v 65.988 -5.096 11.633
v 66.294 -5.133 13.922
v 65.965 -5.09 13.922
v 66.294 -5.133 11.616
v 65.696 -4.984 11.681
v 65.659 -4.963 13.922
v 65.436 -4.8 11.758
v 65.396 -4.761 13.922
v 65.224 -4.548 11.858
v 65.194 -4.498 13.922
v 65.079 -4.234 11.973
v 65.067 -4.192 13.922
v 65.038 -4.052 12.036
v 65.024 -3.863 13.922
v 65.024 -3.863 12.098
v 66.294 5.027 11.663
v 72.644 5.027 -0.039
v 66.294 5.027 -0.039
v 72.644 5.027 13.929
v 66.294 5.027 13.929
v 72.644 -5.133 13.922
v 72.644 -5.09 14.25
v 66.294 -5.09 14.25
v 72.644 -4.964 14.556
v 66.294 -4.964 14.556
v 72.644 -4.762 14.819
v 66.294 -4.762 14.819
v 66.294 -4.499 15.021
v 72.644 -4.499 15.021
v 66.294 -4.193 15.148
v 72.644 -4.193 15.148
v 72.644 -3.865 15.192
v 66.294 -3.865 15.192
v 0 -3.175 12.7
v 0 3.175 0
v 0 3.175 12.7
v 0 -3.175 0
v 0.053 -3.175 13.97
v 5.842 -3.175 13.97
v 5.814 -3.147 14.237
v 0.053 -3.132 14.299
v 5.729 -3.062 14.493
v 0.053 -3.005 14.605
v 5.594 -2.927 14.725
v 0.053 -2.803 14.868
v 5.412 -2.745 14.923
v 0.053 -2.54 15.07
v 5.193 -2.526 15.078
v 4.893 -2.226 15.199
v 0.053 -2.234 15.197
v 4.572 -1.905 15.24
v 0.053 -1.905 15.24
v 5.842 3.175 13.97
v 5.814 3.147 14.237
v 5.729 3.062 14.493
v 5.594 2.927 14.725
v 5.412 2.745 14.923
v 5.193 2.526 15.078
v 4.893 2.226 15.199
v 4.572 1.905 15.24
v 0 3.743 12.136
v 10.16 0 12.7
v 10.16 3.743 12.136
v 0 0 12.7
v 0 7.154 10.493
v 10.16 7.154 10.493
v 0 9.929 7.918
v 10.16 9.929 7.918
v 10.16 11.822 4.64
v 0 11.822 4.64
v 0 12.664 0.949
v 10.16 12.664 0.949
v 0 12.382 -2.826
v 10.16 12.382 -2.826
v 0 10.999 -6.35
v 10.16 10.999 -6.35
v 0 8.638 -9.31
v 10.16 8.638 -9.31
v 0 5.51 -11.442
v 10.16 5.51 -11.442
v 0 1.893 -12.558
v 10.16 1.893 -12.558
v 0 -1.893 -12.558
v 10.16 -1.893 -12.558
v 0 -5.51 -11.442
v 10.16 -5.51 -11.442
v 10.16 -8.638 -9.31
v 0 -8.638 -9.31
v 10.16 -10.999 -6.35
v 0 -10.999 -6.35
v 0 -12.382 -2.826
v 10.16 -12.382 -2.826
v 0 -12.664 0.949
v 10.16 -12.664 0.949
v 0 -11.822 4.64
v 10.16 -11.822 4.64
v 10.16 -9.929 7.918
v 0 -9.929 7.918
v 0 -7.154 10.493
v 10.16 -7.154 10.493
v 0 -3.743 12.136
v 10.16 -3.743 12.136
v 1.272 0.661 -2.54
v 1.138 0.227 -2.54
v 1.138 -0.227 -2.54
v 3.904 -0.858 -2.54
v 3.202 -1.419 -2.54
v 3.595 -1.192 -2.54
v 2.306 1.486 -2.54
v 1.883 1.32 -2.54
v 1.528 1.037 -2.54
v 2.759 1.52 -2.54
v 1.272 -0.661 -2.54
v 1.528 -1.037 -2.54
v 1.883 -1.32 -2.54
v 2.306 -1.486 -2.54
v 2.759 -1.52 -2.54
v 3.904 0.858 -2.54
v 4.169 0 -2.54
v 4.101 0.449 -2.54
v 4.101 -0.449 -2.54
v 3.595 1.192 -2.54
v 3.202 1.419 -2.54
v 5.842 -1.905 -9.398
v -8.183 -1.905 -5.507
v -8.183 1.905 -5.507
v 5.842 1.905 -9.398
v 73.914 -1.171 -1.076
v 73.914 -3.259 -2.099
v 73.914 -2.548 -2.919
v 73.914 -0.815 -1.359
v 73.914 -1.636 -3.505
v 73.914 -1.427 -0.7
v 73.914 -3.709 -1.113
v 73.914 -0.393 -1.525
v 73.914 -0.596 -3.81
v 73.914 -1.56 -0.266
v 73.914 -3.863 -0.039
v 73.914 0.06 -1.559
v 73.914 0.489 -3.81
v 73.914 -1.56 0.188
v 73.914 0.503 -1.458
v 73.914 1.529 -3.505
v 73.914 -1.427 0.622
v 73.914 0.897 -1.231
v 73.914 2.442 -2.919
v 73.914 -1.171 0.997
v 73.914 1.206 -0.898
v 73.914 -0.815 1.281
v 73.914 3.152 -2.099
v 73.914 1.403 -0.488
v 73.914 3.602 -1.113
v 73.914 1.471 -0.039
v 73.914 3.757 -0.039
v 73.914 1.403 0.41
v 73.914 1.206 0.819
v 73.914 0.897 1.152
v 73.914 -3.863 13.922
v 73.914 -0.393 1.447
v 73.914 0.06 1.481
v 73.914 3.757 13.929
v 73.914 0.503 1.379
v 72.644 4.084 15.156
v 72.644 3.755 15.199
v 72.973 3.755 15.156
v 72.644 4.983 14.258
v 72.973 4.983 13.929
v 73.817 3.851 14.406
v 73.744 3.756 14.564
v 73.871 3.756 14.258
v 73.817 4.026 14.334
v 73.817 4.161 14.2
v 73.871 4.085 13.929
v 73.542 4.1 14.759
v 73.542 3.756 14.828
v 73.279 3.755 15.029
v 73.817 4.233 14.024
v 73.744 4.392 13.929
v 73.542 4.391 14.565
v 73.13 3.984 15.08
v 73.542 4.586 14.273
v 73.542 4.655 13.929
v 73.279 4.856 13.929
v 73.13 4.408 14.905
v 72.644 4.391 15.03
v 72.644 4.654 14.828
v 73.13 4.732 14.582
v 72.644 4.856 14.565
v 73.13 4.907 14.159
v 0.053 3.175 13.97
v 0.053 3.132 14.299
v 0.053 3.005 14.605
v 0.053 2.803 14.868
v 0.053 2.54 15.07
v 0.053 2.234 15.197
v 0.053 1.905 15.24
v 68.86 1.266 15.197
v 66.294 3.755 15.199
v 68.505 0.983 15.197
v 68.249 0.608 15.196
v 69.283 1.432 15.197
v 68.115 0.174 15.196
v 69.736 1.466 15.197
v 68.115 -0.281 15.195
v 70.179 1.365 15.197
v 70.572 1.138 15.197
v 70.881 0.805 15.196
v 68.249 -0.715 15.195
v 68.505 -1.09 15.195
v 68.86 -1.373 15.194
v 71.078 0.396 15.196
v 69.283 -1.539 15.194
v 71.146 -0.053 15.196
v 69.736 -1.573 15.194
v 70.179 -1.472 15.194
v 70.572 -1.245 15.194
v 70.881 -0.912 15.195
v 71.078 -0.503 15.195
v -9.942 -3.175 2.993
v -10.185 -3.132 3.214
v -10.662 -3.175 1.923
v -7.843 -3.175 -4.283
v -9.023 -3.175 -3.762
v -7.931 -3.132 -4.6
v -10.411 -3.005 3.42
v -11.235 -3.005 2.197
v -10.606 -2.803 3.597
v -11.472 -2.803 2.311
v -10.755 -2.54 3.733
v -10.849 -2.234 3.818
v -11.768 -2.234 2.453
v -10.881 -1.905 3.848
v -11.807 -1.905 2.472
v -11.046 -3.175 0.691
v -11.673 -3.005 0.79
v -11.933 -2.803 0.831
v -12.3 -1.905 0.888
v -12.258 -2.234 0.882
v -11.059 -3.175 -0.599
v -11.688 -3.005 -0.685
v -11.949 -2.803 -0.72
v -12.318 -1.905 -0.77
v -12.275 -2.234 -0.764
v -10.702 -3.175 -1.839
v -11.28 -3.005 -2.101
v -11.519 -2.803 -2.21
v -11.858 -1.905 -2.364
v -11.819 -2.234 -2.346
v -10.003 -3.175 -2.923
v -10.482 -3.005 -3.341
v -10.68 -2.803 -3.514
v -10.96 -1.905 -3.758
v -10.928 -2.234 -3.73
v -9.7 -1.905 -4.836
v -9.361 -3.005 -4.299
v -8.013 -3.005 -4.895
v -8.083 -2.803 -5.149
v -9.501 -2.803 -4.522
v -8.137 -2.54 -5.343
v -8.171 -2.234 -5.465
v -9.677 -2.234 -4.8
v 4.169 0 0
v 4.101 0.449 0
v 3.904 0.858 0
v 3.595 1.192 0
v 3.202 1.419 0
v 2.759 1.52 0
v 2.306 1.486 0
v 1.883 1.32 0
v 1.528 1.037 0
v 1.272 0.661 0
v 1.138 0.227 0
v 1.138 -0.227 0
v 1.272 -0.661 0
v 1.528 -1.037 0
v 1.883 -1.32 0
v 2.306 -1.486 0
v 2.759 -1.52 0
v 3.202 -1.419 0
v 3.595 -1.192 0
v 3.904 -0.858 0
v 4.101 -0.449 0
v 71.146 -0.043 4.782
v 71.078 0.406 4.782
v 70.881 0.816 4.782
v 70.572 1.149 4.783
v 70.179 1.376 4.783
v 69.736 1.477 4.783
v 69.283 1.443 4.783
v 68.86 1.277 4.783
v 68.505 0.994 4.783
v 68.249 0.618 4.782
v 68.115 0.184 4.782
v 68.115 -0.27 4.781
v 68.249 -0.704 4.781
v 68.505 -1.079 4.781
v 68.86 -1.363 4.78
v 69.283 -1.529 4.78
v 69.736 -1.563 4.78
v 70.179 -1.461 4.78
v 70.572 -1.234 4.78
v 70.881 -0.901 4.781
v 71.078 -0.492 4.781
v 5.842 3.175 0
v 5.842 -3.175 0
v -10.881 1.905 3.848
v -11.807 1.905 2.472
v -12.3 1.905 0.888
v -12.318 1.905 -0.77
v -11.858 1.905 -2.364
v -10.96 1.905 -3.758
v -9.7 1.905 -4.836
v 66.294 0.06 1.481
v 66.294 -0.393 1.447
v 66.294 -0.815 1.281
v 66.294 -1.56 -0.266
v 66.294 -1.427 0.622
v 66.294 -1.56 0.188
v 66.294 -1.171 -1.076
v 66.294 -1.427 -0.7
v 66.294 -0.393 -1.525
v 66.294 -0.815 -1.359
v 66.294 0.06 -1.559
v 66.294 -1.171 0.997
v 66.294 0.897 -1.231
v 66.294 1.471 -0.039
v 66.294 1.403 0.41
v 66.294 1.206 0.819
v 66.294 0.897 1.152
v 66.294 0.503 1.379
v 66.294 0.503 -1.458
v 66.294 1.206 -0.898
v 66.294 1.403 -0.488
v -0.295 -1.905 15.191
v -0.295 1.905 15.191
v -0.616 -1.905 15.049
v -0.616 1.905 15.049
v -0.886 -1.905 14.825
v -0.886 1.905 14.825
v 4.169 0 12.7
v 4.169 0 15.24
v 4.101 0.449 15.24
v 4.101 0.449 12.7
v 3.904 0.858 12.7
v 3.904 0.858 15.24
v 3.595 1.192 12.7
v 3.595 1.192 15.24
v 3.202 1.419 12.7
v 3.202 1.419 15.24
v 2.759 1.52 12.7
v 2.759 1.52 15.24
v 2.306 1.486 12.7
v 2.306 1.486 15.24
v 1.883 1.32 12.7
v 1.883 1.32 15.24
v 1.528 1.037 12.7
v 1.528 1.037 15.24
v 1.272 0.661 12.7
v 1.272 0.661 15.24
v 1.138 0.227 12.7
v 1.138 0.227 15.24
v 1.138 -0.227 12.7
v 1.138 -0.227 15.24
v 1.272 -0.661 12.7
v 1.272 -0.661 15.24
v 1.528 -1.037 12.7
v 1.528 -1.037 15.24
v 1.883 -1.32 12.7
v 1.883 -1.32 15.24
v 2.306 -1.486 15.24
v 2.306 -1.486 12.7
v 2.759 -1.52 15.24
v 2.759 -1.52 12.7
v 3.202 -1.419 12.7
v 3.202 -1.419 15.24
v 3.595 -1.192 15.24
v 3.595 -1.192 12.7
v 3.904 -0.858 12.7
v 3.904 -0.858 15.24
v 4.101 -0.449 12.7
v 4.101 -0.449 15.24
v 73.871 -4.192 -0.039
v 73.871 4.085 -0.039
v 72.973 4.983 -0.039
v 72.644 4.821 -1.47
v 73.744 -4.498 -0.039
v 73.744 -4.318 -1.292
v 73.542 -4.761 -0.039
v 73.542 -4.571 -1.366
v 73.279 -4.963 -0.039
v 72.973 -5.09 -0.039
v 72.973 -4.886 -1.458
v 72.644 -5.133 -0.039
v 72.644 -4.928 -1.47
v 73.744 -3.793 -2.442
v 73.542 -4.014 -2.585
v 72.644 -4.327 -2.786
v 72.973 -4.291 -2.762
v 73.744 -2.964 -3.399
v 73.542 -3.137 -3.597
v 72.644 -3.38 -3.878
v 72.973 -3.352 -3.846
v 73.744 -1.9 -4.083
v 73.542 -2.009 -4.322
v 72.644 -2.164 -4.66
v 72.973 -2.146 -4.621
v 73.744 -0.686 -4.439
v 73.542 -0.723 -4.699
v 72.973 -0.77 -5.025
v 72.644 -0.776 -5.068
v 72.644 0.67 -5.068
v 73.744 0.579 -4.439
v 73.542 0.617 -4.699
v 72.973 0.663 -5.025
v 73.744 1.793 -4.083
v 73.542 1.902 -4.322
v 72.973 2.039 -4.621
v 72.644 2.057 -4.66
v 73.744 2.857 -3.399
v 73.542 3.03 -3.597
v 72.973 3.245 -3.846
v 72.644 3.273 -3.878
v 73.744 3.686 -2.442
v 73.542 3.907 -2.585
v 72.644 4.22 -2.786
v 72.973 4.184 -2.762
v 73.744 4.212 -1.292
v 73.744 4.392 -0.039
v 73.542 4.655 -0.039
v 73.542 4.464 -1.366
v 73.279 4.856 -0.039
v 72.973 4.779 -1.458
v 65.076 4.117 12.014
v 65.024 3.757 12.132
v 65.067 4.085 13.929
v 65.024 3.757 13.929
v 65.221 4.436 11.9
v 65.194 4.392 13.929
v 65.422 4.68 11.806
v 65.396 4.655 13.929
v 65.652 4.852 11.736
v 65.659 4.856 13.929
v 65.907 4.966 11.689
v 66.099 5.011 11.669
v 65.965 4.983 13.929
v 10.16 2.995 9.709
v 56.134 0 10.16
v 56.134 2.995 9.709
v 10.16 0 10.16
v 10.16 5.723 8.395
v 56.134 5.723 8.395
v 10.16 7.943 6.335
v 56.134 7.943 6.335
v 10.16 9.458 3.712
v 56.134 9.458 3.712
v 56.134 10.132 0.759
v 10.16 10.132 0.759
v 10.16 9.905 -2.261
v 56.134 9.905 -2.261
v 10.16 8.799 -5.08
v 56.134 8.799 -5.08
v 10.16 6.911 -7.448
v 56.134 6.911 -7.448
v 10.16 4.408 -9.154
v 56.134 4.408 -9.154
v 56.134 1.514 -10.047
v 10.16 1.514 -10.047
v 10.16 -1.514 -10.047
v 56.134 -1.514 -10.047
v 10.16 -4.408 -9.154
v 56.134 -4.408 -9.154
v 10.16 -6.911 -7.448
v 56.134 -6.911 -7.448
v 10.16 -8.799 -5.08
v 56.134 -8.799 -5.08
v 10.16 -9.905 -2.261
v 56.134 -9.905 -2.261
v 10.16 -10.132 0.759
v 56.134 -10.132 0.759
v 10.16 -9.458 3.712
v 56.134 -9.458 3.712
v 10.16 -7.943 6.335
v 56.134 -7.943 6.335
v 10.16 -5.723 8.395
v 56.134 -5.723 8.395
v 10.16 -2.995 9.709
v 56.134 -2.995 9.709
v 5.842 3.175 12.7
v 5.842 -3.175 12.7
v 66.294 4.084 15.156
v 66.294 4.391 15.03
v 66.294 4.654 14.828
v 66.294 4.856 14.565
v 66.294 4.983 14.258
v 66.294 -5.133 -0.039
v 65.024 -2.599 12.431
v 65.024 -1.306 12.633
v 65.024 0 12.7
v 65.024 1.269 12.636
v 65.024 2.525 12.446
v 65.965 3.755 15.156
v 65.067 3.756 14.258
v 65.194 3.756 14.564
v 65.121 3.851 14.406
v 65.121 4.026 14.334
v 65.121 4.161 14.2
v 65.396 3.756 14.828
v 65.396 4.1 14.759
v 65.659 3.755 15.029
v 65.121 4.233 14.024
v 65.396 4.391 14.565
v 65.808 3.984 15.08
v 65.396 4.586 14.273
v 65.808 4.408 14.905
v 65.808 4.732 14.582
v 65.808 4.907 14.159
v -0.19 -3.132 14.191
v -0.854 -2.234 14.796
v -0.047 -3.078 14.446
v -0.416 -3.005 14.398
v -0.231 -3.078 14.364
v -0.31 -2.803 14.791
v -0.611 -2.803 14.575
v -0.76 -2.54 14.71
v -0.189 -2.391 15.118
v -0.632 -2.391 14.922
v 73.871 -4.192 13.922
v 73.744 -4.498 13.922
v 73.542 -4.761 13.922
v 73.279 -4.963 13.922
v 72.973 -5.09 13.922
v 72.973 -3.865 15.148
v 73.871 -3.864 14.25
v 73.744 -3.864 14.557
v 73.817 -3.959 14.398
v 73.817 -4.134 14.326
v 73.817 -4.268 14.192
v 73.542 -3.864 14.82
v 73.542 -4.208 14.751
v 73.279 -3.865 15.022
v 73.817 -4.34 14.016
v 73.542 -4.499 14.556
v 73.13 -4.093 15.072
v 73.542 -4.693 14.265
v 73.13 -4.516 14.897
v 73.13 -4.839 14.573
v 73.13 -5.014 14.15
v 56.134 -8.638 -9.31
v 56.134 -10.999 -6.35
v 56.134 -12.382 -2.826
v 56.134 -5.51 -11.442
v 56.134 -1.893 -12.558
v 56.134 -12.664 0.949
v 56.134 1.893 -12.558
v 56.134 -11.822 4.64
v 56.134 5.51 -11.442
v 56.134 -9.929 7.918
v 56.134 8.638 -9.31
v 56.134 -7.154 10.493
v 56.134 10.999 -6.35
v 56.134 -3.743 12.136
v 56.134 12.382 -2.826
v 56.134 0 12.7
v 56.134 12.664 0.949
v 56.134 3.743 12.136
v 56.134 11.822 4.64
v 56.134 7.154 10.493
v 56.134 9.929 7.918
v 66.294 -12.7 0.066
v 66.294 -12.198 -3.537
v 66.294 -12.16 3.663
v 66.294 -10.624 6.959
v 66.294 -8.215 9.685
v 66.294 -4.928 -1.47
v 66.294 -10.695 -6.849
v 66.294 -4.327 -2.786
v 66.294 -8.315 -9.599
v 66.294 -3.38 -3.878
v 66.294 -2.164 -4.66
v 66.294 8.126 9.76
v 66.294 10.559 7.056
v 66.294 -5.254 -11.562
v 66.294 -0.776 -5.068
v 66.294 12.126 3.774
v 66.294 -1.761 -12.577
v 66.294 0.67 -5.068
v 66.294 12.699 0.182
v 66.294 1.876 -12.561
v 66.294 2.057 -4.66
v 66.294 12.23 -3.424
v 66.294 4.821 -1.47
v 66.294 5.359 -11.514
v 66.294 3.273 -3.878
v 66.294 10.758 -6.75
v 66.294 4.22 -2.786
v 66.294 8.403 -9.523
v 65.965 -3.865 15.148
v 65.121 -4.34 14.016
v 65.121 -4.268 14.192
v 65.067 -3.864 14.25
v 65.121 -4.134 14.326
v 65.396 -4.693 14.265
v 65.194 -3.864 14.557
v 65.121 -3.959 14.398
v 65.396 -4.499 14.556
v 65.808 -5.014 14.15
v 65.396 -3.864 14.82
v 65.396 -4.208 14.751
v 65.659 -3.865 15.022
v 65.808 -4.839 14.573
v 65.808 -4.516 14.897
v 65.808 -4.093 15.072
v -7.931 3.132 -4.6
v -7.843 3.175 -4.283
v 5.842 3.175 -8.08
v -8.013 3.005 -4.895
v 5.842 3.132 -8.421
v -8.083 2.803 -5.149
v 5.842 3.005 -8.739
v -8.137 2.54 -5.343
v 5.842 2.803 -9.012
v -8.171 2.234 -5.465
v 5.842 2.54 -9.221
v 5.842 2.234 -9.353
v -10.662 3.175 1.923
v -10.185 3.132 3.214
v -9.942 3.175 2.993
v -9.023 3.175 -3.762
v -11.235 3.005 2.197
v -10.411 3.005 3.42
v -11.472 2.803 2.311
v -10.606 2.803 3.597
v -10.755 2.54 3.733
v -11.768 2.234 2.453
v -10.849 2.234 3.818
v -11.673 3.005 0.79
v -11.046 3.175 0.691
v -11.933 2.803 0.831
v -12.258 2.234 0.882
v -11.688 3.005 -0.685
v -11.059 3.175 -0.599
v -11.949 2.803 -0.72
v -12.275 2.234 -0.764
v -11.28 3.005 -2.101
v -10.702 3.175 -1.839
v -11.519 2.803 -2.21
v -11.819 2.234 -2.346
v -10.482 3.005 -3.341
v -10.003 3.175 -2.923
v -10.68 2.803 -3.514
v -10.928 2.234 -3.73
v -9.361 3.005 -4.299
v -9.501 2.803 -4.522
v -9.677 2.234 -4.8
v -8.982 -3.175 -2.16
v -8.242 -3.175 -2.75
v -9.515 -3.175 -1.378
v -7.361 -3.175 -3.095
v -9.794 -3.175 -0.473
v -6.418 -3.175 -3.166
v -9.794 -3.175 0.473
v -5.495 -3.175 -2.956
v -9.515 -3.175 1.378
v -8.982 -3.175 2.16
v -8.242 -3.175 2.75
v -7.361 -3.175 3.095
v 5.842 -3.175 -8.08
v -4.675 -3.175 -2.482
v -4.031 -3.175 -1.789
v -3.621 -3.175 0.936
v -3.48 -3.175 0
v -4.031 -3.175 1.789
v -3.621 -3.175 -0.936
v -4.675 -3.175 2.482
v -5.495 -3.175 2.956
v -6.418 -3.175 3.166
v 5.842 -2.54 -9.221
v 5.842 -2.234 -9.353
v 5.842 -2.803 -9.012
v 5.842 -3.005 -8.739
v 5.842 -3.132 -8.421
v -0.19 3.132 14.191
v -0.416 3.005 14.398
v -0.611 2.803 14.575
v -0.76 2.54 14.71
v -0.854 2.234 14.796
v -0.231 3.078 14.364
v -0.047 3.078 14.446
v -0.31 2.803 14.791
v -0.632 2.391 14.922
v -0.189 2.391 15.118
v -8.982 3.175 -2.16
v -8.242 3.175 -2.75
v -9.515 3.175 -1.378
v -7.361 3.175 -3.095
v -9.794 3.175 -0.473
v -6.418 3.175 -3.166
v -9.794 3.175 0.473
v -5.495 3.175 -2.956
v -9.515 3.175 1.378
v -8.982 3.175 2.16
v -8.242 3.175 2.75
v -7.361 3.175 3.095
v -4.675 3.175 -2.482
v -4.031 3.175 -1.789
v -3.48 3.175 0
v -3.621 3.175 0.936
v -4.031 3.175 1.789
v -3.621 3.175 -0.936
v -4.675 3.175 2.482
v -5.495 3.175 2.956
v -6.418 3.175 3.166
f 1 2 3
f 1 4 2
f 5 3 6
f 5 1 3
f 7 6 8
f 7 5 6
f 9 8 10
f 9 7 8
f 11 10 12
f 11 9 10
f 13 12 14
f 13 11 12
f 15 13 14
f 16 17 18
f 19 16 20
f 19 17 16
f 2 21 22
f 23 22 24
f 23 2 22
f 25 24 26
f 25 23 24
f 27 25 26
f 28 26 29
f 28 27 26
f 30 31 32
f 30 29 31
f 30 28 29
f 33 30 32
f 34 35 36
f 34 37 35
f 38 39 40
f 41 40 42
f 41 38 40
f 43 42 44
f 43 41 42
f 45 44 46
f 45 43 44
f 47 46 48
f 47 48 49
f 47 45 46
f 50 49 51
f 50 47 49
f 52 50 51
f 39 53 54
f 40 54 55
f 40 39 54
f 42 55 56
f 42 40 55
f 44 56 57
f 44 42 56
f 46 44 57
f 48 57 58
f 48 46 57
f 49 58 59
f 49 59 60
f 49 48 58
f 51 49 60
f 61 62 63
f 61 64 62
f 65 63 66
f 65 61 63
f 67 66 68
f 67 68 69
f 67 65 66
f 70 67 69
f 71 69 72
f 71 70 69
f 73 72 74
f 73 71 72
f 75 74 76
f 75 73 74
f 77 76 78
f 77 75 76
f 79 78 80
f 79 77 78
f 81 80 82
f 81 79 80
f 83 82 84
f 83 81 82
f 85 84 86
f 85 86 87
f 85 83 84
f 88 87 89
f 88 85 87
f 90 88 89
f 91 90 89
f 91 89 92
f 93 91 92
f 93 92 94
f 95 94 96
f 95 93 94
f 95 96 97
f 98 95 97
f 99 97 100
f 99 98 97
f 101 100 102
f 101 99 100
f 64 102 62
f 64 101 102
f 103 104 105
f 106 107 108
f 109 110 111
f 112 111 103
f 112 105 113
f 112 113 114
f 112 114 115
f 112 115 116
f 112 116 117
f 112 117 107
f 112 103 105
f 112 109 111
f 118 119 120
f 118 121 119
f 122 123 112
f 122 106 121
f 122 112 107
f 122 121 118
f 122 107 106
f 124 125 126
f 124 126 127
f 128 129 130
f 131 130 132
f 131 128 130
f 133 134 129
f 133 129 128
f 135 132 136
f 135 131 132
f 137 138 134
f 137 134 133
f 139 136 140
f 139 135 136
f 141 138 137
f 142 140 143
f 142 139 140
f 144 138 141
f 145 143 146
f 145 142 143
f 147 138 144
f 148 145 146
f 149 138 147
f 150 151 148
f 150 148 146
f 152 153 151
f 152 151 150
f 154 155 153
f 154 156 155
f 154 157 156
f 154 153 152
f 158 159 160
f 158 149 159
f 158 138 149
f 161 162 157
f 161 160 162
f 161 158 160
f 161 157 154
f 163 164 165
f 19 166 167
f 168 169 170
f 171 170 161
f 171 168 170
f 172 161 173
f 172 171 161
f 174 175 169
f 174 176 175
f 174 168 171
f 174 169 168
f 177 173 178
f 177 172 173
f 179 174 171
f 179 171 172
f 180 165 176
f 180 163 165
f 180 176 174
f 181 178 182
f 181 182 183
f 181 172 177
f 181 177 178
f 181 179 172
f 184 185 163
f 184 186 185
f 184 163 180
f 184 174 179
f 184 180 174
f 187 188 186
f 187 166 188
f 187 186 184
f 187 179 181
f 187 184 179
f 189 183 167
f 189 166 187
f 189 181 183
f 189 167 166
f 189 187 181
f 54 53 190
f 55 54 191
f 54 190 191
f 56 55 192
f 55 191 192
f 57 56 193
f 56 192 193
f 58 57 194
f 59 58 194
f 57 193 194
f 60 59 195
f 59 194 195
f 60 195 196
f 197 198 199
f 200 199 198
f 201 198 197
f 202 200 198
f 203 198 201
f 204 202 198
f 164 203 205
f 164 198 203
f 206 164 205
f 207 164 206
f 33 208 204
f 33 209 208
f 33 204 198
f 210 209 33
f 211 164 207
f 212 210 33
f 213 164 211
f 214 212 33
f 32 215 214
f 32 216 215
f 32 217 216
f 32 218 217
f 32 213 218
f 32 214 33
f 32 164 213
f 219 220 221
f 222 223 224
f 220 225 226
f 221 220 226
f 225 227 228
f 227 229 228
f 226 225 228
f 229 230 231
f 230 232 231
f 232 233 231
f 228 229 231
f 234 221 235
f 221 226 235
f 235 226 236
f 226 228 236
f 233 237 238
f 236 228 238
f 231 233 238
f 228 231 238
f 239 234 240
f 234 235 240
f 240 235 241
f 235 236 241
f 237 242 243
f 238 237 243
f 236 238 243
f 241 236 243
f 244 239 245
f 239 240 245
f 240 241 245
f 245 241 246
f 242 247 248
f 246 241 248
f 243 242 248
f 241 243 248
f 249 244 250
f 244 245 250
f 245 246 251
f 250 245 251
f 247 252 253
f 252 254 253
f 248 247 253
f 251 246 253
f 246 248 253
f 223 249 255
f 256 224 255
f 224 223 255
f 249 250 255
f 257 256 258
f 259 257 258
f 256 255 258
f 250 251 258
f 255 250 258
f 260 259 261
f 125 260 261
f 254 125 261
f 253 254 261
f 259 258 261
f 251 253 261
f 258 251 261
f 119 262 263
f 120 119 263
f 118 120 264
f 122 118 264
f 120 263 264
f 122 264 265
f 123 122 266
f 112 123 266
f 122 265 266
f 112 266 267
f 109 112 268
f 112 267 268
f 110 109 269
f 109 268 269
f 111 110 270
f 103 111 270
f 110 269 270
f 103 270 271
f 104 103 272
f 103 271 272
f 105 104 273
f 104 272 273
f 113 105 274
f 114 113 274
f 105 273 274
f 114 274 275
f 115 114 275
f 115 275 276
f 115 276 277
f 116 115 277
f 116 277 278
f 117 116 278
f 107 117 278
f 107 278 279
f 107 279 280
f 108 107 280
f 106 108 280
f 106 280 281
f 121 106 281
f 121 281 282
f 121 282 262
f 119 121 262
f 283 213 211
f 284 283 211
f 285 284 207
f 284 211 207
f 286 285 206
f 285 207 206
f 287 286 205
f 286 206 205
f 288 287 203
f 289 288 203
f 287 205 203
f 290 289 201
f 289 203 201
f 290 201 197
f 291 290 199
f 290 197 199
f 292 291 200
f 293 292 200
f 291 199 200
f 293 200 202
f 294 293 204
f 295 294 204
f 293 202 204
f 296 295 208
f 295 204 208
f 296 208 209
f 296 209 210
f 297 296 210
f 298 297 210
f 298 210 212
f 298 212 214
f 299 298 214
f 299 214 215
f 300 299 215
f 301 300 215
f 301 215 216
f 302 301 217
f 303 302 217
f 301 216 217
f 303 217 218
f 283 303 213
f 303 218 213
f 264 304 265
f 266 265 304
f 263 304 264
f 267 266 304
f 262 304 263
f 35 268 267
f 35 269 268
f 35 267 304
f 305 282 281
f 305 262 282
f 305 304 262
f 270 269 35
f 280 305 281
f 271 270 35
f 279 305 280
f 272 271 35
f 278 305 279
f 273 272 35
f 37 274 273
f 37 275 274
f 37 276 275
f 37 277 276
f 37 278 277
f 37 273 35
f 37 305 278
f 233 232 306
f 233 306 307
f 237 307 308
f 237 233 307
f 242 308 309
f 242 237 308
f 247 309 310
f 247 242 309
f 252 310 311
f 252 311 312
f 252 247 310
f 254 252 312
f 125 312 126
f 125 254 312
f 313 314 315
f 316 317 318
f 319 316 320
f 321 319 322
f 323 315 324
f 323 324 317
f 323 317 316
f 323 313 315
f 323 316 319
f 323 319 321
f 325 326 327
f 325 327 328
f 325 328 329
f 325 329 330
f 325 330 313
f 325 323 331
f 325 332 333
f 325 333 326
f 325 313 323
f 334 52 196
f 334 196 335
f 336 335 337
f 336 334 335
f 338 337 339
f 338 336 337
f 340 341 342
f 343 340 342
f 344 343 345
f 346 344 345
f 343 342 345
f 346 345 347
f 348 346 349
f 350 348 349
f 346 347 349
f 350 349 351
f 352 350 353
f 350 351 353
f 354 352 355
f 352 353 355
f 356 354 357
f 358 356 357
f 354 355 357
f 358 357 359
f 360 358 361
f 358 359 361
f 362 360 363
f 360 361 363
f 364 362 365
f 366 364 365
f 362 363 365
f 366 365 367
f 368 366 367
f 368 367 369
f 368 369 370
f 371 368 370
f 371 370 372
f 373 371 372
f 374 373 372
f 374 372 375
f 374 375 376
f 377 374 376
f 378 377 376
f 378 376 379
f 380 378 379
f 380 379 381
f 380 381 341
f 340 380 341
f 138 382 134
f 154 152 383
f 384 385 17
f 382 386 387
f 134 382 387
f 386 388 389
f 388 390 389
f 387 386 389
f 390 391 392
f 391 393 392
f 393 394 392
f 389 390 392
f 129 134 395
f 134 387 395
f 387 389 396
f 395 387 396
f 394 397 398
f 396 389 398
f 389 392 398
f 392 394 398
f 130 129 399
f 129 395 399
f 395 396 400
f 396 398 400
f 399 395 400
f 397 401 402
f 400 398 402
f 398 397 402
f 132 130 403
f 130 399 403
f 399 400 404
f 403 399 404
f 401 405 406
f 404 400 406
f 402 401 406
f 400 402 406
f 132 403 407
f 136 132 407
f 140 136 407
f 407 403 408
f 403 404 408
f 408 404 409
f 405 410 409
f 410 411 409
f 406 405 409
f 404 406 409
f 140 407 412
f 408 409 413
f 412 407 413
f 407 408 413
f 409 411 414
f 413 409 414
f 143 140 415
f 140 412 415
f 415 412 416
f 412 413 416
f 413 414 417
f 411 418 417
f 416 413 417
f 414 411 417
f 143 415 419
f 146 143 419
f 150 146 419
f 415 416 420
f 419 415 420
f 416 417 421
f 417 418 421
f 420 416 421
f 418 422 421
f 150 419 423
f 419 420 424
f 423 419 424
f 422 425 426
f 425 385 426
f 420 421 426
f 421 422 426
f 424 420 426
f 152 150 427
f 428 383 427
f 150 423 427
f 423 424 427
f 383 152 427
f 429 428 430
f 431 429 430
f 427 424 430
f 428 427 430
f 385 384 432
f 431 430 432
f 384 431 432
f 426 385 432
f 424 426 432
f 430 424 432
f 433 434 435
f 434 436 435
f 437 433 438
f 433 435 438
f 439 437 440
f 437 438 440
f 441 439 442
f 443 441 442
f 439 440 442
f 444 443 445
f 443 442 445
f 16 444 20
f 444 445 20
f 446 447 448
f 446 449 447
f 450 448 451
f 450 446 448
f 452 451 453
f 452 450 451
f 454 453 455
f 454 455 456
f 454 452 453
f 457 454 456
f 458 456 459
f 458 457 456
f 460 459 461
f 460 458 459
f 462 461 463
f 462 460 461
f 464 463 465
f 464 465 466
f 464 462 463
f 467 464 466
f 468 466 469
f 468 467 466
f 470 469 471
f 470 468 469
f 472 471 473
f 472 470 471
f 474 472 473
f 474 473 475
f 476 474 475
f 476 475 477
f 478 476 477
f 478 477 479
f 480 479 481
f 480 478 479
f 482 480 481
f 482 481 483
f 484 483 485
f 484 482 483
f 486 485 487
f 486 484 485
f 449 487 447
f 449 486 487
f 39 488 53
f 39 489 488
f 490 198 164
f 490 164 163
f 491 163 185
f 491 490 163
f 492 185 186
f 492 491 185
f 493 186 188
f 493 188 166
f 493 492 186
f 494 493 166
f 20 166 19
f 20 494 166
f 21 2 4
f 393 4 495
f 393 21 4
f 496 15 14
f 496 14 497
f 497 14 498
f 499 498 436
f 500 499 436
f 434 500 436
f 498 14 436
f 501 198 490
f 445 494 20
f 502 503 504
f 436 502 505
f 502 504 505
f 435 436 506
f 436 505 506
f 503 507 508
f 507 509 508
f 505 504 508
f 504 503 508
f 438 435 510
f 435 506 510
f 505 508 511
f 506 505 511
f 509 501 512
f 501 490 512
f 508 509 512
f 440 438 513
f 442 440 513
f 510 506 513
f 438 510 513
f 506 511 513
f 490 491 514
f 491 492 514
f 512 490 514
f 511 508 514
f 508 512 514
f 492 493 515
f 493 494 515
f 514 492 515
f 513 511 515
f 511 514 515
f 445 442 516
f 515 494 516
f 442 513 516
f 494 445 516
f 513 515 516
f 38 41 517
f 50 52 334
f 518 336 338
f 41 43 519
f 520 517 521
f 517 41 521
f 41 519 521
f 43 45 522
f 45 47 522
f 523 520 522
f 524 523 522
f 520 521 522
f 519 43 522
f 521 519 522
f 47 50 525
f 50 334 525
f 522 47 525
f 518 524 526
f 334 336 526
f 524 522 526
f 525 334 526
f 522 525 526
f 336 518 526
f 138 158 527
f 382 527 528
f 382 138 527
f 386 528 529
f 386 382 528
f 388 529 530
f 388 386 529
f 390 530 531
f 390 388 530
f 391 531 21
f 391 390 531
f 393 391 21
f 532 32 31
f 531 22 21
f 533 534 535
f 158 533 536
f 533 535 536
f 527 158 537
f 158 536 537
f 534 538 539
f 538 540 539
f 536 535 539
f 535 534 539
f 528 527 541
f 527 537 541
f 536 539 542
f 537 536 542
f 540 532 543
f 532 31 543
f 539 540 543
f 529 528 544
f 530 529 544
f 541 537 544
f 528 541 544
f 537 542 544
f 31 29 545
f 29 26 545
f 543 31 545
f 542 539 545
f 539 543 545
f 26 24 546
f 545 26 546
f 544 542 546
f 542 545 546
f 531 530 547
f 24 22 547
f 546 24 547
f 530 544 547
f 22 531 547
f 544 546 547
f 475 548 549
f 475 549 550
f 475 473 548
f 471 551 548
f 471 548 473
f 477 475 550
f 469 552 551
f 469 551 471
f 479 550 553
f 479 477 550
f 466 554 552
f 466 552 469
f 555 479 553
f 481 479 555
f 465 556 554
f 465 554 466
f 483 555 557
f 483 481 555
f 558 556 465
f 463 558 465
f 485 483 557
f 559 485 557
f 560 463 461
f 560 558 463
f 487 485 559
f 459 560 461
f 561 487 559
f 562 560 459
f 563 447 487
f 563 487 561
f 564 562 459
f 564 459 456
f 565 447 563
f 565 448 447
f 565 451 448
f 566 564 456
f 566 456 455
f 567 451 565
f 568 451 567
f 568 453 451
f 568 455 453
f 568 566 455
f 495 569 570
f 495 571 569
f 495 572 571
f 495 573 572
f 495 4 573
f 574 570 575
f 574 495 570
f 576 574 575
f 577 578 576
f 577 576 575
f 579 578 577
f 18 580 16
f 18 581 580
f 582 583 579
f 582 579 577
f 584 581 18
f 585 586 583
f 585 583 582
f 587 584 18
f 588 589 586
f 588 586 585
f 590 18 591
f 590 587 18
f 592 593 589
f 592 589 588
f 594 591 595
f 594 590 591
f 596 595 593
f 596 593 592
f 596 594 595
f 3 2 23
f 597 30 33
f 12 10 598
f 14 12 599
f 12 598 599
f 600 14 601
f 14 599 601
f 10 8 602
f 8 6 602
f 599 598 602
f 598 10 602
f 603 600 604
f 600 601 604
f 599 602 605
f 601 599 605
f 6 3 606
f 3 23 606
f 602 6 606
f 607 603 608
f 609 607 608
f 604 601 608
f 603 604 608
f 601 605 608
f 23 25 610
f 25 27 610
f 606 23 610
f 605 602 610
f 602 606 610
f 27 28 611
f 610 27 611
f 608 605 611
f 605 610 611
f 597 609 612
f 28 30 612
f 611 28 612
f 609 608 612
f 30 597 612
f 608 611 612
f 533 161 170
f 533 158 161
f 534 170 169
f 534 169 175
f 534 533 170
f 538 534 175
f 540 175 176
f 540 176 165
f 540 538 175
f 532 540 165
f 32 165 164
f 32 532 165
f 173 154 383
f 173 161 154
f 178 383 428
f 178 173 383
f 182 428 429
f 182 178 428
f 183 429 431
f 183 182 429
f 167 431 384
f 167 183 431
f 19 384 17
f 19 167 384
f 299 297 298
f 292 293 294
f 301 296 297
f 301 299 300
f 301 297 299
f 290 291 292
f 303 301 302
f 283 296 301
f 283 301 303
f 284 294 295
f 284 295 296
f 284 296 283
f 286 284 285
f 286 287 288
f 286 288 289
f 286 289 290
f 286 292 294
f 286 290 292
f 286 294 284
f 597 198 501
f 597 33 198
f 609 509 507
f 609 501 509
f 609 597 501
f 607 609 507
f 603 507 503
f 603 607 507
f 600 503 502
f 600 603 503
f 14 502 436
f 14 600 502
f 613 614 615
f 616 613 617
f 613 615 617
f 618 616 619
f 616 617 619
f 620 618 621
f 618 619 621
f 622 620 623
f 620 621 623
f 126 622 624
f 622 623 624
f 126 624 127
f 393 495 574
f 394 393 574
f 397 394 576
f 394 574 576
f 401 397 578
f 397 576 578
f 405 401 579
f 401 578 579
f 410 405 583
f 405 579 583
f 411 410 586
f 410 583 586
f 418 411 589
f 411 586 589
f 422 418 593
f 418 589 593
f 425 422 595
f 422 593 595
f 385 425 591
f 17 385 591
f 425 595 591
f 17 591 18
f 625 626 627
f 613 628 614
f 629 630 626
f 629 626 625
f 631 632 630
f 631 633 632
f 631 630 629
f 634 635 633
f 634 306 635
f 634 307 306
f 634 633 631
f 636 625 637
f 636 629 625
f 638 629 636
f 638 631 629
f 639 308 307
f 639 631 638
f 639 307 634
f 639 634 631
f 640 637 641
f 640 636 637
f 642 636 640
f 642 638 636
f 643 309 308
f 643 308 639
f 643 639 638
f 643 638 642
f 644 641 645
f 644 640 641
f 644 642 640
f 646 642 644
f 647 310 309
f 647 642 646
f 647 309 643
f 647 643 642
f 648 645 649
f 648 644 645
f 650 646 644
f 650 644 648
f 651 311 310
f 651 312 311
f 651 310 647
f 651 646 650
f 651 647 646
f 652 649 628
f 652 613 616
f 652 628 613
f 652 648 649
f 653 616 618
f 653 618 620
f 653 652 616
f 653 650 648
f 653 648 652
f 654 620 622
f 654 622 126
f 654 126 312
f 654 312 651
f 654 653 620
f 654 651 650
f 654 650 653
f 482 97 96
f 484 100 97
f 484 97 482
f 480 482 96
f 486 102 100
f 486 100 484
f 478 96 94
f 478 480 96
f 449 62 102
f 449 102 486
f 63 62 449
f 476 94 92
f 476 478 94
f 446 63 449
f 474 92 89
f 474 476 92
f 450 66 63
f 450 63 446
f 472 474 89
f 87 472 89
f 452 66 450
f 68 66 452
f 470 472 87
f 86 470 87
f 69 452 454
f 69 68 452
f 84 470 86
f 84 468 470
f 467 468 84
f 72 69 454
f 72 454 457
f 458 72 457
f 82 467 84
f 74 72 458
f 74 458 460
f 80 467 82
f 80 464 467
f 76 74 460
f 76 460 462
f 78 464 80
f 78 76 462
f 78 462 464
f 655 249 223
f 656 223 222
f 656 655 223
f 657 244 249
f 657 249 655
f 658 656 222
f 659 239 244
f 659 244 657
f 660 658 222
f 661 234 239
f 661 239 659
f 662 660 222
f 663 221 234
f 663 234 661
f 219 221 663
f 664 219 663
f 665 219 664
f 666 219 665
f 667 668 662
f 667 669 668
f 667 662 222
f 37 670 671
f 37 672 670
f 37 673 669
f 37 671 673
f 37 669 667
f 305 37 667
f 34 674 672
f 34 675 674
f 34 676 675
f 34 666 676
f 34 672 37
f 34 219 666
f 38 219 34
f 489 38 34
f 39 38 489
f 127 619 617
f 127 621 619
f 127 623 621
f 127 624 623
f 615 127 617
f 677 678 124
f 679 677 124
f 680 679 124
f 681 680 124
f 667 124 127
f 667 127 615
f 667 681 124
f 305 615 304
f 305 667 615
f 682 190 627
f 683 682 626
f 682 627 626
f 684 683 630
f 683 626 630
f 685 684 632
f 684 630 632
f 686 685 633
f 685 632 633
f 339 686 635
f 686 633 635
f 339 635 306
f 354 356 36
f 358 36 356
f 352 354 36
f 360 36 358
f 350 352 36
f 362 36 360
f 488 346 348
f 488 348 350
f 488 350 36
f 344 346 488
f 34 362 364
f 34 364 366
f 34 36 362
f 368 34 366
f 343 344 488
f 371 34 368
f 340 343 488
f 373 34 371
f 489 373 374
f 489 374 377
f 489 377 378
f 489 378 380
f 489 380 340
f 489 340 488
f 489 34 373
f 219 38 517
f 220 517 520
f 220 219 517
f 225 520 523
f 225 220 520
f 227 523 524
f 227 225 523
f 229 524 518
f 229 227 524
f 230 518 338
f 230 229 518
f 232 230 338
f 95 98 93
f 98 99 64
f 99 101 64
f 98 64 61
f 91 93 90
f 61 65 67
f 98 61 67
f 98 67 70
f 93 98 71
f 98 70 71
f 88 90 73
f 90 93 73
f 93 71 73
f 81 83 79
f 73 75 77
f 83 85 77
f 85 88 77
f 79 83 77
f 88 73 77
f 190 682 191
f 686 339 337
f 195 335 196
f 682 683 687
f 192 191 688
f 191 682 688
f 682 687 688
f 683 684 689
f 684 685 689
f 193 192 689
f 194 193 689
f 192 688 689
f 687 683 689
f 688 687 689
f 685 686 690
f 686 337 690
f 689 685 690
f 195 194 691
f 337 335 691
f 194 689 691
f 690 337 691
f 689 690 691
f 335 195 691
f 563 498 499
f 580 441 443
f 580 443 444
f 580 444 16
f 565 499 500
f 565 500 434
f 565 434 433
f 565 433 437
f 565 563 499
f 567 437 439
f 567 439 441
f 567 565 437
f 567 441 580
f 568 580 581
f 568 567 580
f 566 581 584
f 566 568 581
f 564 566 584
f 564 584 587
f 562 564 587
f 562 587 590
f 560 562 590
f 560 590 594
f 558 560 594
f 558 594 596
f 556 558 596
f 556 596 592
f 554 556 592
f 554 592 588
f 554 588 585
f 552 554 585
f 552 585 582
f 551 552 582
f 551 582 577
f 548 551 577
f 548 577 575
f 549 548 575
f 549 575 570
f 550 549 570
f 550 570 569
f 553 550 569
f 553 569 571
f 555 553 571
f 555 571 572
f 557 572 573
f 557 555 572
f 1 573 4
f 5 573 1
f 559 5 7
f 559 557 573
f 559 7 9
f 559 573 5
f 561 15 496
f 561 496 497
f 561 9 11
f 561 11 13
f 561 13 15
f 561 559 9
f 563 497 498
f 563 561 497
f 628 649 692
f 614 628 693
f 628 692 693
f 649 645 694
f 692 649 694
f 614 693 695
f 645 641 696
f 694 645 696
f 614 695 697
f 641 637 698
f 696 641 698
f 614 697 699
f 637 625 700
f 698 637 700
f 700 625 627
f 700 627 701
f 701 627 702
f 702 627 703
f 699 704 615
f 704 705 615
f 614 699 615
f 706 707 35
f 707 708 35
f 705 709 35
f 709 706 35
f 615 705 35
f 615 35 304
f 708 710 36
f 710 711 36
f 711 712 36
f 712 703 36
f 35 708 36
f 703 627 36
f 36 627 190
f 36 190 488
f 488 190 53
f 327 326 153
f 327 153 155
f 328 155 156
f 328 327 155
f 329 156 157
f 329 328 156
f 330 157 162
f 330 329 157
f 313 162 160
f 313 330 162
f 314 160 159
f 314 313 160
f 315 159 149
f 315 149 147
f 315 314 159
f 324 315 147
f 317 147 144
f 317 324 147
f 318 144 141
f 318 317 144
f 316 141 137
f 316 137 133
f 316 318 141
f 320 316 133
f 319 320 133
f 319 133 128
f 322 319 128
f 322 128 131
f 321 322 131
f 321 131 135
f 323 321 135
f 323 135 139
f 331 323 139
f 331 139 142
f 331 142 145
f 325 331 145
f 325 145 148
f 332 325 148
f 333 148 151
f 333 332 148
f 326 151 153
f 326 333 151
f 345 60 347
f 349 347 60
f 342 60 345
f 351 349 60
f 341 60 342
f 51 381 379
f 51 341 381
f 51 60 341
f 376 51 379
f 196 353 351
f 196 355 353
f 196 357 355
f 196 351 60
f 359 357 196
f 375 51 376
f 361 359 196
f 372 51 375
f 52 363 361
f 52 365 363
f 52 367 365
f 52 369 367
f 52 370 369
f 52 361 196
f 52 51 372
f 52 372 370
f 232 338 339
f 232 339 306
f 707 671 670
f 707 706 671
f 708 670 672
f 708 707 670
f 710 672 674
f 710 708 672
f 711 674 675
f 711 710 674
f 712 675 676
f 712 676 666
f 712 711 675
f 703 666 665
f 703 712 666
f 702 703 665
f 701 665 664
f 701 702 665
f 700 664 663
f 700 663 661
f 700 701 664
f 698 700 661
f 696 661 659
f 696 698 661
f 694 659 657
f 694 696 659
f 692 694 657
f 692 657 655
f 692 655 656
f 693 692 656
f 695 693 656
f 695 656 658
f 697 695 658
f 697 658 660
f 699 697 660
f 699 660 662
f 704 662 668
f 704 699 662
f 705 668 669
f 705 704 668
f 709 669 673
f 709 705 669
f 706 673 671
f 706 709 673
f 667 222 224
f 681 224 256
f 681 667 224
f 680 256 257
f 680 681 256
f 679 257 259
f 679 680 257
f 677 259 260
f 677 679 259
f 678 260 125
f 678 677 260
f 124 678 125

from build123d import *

# Parameters (mm, degrees)
F0_W          = 5.842
F0_H          = 12.7
F0_R          = 3.175
F3_DEPTH      = 3.175
F4_R          = 1.524
F5_DEPTH      = 7.62
F5_DEPTH_BACK = 1.27
F6_R          = 1.524
F7_DEPTH      = 17.78
F8_R          = 1.524
F9_DEPTH      = 10.414
F10_R         = 1.27
F10_2_R       = 1.27


with BuildPart() as f1:
    # F0 (on Front) → F1 (revolve)
    with BuildSketch(Plane.XZ):
        Polygon((5.842, 12.7), (5.842, 0), (66.294, 0), (66.294, 12.7), (56.134, 12.7), (56.134, 10.16), (10.16, 10.16), (10.16, 12.7), align=None)
        with Locations((2.921, 6.35)):
            Rectangle(F0_W, F0_H)
    revolve(axis=Axis((33.147, 0, 0), (-1, 0, 0)))

    # F4 (on face) → F5 (join, two sides)
    with BuildSketch(Plane.YZ.offset(66.294)) as f5_sk:
        with BuildLine():
            ThreePointArc((-5.1334373321, -0.0392104594), (-0.0534373321, -5.1192104594), (5.0265626679, -0.0392104594))
            ThreePointArc((5.0265626679, -0.0392104594), (-0.0534373321, 5.0407895406), (-5.1334373321, -0.0392104594))
        make_face()
        with Locations((-0.0534373321, -0.0392104594)):
            Circle(F4_R, mode=Mode.SUBTRACT)
        with BuildLine():
            ThreePointArc((-5.1334373321, -0.0392104594), (-0.0534373321, 5.0407895406), (5.0265626679, -0.0392104594))
            Line((5.0265626679, -0.0392104594), (5.0265626679, 15.2007895406))
            Line((5.0265626679, 15.2007895406), (-5.1334373321, 15.1903787628))
            Line((-5.1334373321, 15.1903787628), (-5.1334373321, -0.0392104594))
        make_face()
    extrude(amount=F5_DEPTH)
    extrude(f5_sk.sketch, amount=-F5_DEPTH_BACK)

    # F8 (on face) → F9 (cut)
    with BuildSketch(Plane(origin=(0, -0.0155706944, 15.195622953), x_dir=(1, 0, 0), z_dir=(0, -0.0010246823, 0.999999475))):
        with Locations((69.6220099926, -0.0378666576)):
            Circle(F8_R)
    extrude(amount=-F9_DEPTH, mode=Mode.SUBTRACT)

    # F10
    f10_edges = [f1.edges().sort_by_distance(p)[0] for p in [
        (69.469, 5.026563, 15.20079),
        (65.024, -0.053437, 15.195584),
        (69.469, -5.133437, 15.190379),
        (73.914, -0.053437, 15.195584),
        (65.024, 5.026563, 13.431854),
        (65.024, -5.133437, 13.403326),
        (73.914, 5.026563, 7.58079),
        (73.914, -0.053437, -5.11921),
        (73.914, -5.133437, 7.575584),
    ]]
    fillet(f10_edges, radius=F10_R)


with BuildPart() as f3:
    # F0 (on Front) → F3 (new body, symmetric)
    with BuildSketch(Plane.XZ):
        with BuildLine():
            Line((-0.9398, 0), (0, 0))
            Line((0, 0), (0, 12.7))
            Line((0, 12.7), (5.842, 12.7))
            Line((5.842, 12.7), (5.842, 15.24))
            Line((5.842, 15.24), (-0.508, 15.24))
            Line((-0.508, 15.24), (-10.8806298187, 3.8475430269))
            ThreePointArc((-10.8806298187, 3.8475430269), (-4.5919612295, 5.3297205562), (-0.9398, 0))
        make_face()
        with BuildLine():
            Line((5.842, 0), (0, 0))
            Line((0, 0), (-0.9398, 0))
            ThreePointArc((-0.9398, 0), (-3.1957909266, -4.5493385486), (-8.1826630726, -5.5069827884))
            Line((-8.1826630726, -5.5069827884), (5.842, -9.398))
            Line((5.842, -9.398), (5.842, 0))
        make_face()
        with BuildLine():
            ThreePointArc((-8.1826630726, -5.5069827884), (-3.1957909266, -4.5493385486), (-0.9398, 0))
            ThreePointArc((-0.9398, 0), (-4.5919612295, 5.3297205562), (-10.8806298187, 3.8475430269))
            ThreePointArc((-10.8806298187, 3.8475430269), (-12.1459778134, -1.5837270034), (-8.1826630726, -5.5069827884))
        make_face()
        with Locations((-6.6548, 0)):
            Circle(F0_R, mode=Mode.SUBTRACT)
    extrude(amount=F3_DEPTH, both=True)

    # F6 (on face) → F7 (cut)
    with BuildSketch(Plane.XY.offset(15.24)):
        with Locations((2.6447647251, 0)):
            Circle(F6_R)
    extrude(amount=-F7_DEPTH, mode=Mode.SUBTRACT)

    # F10#2
    f10_2_edges = [f3.edges().sort_by_distance(p)[0] for p in [
        (2.667, 3.175, 15.24),
        (-0.508, 0, 15.24),
        (2.667, -3.175, 15.24),
        (5.842, 0, 15.24),
        (-5.694315, 3.175, 9.543772),
        (-5.694315, -3.175, 9.543772),
        (-12.145978, 3.175, -1.583727),
        (-12.145978, -3.175, -1.583727),
        (-1.170332, 3.175, -7.452491),
        (-1.170332, -3.175, -7.452491),
    ]]
    fillet(f10_2_edges, radius=F10_2_R)


solid = Compound([f1.part, f3.part])
